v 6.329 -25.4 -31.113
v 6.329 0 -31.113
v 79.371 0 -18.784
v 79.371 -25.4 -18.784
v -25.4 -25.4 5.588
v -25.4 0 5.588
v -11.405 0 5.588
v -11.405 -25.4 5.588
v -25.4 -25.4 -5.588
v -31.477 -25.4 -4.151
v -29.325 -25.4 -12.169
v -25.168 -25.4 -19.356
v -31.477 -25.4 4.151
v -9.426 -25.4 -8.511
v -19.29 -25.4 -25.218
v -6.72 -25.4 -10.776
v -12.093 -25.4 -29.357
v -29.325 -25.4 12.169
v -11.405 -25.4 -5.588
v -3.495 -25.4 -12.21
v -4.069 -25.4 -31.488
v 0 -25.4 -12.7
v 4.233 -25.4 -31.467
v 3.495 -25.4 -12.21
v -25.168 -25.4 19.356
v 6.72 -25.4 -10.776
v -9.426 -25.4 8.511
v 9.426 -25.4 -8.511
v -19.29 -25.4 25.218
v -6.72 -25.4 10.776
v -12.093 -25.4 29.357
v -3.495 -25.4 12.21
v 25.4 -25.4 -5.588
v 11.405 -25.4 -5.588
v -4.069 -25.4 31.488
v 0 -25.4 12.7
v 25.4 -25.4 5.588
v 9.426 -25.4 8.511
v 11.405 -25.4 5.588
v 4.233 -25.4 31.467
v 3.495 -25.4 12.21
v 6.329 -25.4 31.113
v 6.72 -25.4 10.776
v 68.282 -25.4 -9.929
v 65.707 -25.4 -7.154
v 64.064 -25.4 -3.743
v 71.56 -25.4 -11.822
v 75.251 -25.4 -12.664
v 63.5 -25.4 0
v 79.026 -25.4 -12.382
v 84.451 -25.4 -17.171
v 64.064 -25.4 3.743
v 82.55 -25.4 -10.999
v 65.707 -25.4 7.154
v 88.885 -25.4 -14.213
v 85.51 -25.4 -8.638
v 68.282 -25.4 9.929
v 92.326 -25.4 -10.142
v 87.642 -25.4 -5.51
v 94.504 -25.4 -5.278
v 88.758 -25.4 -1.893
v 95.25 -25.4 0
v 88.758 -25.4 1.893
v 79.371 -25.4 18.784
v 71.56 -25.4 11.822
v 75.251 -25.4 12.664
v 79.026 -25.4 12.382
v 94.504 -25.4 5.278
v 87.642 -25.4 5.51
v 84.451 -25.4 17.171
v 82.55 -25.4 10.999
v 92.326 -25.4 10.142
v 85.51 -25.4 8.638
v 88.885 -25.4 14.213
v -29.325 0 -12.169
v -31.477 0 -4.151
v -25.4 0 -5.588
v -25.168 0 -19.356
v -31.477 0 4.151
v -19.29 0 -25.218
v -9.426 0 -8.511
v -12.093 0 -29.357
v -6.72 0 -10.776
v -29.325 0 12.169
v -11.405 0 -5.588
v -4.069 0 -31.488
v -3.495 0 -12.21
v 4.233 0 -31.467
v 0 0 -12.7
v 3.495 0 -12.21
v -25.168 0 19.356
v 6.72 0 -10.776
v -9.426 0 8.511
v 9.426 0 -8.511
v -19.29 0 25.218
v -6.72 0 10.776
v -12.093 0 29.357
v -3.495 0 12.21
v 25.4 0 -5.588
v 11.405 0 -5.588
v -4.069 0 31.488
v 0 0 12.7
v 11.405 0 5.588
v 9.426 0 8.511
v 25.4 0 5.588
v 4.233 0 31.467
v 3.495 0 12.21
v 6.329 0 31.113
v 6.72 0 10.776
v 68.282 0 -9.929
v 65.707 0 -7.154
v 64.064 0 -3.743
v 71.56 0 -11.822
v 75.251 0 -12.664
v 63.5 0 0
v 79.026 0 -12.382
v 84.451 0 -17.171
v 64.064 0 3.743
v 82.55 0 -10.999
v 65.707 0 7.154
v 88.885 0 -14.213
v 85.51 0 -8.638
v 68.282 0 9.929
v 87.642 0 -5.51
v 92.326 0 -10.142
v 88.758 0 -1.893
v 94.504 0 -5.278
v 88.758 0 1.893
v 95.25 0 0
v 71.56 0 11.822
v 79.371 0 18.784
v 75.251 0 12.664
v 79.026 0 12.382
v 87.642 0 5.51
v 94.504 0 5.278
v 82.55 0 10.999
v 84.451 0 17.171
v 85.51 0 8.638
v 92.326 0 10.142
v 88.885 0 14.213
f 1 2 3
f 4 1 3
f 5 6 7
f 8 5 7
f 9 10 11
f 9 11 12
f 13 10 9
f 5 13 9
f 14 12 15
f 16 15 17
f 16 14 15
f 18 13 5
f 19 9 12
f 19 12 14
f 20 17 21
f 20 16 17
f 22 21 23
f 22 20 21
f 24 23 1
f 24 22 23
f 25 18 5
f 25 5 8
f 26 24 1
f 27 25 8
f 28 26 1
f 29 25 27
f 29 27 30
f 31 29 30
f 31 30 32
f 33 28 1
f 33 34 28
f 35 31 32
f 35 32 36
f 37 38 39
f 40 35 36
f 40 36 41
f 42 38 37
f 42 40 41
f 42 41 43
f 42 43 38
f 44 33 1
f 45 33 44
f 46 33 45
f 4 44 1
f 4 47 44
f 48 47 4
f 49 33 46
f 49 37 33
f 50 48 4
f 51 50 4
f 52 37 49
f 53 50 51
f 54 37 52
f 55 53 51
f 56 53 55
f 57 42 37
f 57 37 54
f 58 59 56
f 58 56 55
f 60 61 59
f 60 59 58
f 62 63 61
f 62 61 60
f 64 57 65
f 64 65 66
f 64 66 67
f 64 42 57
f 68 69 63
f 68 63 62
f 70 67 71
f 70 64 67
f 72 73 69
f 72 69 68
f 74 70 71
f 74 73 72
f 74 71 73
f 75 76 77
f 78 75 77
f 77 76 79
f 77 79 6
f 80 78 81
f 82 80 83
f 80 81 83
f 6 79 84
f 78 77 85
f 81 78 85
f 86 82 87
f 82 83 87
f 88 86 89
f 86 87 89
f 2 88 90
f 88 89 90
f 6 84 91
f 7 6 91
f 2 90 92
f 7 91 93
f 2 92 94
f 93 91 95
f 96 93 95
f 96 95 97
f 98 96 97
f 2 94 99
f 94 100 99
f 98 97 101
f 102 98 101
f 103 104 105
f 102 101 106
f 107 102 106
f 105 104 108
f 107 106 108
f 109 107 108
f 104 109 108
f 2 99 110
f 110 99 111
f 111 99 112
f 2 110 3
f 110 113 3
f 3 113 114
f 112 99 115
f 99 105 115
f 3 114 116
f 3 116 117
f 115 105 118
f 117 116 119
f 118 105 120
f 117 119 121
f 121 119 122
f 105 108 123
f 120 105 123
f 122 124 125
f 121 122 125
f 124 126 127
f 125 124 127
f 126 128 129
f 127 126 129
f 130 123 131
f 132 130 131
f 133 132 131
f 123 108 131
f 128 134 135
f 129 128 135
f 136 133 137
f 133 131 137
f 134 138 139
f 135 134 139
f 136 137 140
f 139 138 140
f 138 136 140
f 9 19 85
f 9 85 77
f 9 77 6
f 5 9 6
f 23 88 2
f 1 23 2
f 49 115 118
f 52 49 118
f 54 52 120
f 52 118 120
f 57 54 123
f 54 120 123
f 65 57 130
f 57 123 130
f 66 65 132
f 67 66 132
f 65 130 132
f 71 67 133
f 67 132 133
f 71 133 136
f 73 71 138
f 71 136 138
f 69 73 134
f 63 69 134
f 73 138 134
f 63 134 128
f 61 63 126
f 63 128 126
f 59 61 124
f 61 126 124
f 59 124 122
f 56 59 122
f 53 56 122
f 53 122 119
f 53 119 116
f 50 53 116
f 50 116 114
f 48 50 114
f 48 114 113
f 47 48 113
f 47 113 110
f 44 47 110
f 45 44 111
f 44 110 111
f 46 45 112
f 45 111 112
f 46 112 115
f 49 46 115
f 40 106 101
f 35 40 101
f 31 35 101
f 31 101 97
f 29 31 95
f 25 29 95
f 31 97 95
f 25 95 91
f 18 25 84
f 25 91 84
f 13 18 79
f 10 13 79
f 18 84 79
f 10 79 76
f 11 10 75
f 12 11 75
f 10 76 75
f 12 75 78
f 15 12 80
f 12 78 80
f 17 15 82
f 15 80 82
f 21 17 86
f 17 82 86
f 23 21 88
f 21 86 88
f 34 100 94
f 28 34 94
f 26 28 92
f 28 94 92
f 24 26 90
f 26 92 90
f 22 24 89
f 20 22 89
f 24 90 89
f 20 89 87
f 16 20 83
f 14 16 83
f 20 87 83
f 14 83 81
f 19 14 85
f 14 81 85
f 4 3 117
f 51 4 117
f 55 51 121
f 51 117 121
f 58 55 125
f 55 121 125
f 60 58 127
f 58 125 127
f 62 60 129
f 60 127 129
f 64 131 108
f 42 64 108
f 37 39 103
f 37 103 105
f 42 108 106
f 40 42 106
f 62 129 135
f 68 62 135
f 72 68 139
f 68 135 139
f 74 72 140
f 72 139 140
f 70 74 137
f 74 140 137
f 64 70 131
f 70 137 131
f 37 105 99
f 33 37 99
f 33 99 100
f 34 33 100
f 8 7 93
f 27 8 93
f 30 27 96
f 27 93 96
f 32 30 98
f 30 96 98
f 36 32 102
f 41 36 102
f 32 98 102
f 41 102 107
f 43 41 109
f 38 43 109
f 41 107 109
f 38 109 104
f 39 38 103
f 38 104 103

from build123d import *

# Parameters (mm, degrees)
F1_DEPTH = 25.4


with BuildPart() as f1:
    # F0 (on Front) → F1 (new body)
    with BuildSketch(Plane.XZ):
        with BuildLine():
            Line((6.3292504433, 31.1127480115), (4.2333333333, 31.4665121818))
            ThreePointArc((4.2333333333, 31.4665121818), (-31.75, 0), (4.2333333333, -31.4665121818))
            Line((4.2333333333, -31.4665121818), (6.3292504433, -31.1127480115))
            ThreePointArc((6.3292504433, -31.1127480115), (24.5867464457, -20.0886634501), (31.75, 0))
            ThreePointArc((31.75, 0), (24.5867464457, 20.0886634501), (6.3292504433, 31.1127480115))
        make_face()
        with BuildLine():
            Line((25.4, 5.588), (25.4, 0))
            Line((25.4, 0), (25.4, -5.588))
            Line((25.4, -5.588), (11.4045717149, -5.588))
            ThreePointArc((11.4045717149, -5.588), (0, -12.7), (-11.4045717149, -5.588))
            Line((-11.4045717149, -5.588), (-25.4, -5.588))
            Line((-25.4, -5.588), (-25.4, 5.588))
            Line((-25.4, 5.588), (-11.4045717149, 5.588))
            ThreePointArc((-11.4045717149, 5.588), (0, 12.7), (11.4045717149, 5.588))
            Line((11.4045717149, 5.588), (25.4, 5.588))
        make_face(mode=Mode.SUBTRACT)
        with BuildLine():
            Line((79.3705518859, 18.7843046381), (6.3292504433, 31.1127480115))
            ThreePointArc((6.3292504433, 31.1127480115), (24.5867464457, 20.0886634501), (31.75, 0))
            Line((31.75, 0), (57.15, 0))
            ThreePointArc((57.15, 0), (63.9015552493, 14.5482217715), (79.3705518859, 18.7843046381))
        make_face()
        with BuildLine():
            ThreePointArc((31.75, 0), (24.5867464457, -20.0886634501), (6.3292504433, -31.1127480115))
            Line((6.3292504433, -31.1127480115), (79.3705518859, -18.7843046381))
            ThreePointArc((79.3705518859, -18.7843046381), (63.9015552493, -14.5482217715), (57.15, 0))
            Line((57.15, 0), (31.75, 0))
        make_face()
        with BuildLine():
            ThreePointArc((95.25, 0), (90.7482217715, 12.2984447507), (79.3705518859, 18.7843046381))
            ThreePointArc((79.3705518859, 18.7843046381), (63.9015552493, 14.5482217715), (57.15, 0))
            ThreePointArc((57.15, 0), (63.9015552493, -14.5482217715), (79.3705518859, -18.7843046381))
            ThreePointArc((79.3705518859, -18.7843046381), (90.7482217715, -12.2984447507), (95.25, 0))
        make_face()
        with BuildLine():
            ThreePointArc((88.9, 0), (76.2, -12.7), (63.5, 0))
            ThreePointArc((63.5, 0), (76.2, 12.7), (88.9, 0))
        make_face(mode=Mode.SUBTRACT)
    extrude(amount=F1_DEPTH)


solid = f1.part
